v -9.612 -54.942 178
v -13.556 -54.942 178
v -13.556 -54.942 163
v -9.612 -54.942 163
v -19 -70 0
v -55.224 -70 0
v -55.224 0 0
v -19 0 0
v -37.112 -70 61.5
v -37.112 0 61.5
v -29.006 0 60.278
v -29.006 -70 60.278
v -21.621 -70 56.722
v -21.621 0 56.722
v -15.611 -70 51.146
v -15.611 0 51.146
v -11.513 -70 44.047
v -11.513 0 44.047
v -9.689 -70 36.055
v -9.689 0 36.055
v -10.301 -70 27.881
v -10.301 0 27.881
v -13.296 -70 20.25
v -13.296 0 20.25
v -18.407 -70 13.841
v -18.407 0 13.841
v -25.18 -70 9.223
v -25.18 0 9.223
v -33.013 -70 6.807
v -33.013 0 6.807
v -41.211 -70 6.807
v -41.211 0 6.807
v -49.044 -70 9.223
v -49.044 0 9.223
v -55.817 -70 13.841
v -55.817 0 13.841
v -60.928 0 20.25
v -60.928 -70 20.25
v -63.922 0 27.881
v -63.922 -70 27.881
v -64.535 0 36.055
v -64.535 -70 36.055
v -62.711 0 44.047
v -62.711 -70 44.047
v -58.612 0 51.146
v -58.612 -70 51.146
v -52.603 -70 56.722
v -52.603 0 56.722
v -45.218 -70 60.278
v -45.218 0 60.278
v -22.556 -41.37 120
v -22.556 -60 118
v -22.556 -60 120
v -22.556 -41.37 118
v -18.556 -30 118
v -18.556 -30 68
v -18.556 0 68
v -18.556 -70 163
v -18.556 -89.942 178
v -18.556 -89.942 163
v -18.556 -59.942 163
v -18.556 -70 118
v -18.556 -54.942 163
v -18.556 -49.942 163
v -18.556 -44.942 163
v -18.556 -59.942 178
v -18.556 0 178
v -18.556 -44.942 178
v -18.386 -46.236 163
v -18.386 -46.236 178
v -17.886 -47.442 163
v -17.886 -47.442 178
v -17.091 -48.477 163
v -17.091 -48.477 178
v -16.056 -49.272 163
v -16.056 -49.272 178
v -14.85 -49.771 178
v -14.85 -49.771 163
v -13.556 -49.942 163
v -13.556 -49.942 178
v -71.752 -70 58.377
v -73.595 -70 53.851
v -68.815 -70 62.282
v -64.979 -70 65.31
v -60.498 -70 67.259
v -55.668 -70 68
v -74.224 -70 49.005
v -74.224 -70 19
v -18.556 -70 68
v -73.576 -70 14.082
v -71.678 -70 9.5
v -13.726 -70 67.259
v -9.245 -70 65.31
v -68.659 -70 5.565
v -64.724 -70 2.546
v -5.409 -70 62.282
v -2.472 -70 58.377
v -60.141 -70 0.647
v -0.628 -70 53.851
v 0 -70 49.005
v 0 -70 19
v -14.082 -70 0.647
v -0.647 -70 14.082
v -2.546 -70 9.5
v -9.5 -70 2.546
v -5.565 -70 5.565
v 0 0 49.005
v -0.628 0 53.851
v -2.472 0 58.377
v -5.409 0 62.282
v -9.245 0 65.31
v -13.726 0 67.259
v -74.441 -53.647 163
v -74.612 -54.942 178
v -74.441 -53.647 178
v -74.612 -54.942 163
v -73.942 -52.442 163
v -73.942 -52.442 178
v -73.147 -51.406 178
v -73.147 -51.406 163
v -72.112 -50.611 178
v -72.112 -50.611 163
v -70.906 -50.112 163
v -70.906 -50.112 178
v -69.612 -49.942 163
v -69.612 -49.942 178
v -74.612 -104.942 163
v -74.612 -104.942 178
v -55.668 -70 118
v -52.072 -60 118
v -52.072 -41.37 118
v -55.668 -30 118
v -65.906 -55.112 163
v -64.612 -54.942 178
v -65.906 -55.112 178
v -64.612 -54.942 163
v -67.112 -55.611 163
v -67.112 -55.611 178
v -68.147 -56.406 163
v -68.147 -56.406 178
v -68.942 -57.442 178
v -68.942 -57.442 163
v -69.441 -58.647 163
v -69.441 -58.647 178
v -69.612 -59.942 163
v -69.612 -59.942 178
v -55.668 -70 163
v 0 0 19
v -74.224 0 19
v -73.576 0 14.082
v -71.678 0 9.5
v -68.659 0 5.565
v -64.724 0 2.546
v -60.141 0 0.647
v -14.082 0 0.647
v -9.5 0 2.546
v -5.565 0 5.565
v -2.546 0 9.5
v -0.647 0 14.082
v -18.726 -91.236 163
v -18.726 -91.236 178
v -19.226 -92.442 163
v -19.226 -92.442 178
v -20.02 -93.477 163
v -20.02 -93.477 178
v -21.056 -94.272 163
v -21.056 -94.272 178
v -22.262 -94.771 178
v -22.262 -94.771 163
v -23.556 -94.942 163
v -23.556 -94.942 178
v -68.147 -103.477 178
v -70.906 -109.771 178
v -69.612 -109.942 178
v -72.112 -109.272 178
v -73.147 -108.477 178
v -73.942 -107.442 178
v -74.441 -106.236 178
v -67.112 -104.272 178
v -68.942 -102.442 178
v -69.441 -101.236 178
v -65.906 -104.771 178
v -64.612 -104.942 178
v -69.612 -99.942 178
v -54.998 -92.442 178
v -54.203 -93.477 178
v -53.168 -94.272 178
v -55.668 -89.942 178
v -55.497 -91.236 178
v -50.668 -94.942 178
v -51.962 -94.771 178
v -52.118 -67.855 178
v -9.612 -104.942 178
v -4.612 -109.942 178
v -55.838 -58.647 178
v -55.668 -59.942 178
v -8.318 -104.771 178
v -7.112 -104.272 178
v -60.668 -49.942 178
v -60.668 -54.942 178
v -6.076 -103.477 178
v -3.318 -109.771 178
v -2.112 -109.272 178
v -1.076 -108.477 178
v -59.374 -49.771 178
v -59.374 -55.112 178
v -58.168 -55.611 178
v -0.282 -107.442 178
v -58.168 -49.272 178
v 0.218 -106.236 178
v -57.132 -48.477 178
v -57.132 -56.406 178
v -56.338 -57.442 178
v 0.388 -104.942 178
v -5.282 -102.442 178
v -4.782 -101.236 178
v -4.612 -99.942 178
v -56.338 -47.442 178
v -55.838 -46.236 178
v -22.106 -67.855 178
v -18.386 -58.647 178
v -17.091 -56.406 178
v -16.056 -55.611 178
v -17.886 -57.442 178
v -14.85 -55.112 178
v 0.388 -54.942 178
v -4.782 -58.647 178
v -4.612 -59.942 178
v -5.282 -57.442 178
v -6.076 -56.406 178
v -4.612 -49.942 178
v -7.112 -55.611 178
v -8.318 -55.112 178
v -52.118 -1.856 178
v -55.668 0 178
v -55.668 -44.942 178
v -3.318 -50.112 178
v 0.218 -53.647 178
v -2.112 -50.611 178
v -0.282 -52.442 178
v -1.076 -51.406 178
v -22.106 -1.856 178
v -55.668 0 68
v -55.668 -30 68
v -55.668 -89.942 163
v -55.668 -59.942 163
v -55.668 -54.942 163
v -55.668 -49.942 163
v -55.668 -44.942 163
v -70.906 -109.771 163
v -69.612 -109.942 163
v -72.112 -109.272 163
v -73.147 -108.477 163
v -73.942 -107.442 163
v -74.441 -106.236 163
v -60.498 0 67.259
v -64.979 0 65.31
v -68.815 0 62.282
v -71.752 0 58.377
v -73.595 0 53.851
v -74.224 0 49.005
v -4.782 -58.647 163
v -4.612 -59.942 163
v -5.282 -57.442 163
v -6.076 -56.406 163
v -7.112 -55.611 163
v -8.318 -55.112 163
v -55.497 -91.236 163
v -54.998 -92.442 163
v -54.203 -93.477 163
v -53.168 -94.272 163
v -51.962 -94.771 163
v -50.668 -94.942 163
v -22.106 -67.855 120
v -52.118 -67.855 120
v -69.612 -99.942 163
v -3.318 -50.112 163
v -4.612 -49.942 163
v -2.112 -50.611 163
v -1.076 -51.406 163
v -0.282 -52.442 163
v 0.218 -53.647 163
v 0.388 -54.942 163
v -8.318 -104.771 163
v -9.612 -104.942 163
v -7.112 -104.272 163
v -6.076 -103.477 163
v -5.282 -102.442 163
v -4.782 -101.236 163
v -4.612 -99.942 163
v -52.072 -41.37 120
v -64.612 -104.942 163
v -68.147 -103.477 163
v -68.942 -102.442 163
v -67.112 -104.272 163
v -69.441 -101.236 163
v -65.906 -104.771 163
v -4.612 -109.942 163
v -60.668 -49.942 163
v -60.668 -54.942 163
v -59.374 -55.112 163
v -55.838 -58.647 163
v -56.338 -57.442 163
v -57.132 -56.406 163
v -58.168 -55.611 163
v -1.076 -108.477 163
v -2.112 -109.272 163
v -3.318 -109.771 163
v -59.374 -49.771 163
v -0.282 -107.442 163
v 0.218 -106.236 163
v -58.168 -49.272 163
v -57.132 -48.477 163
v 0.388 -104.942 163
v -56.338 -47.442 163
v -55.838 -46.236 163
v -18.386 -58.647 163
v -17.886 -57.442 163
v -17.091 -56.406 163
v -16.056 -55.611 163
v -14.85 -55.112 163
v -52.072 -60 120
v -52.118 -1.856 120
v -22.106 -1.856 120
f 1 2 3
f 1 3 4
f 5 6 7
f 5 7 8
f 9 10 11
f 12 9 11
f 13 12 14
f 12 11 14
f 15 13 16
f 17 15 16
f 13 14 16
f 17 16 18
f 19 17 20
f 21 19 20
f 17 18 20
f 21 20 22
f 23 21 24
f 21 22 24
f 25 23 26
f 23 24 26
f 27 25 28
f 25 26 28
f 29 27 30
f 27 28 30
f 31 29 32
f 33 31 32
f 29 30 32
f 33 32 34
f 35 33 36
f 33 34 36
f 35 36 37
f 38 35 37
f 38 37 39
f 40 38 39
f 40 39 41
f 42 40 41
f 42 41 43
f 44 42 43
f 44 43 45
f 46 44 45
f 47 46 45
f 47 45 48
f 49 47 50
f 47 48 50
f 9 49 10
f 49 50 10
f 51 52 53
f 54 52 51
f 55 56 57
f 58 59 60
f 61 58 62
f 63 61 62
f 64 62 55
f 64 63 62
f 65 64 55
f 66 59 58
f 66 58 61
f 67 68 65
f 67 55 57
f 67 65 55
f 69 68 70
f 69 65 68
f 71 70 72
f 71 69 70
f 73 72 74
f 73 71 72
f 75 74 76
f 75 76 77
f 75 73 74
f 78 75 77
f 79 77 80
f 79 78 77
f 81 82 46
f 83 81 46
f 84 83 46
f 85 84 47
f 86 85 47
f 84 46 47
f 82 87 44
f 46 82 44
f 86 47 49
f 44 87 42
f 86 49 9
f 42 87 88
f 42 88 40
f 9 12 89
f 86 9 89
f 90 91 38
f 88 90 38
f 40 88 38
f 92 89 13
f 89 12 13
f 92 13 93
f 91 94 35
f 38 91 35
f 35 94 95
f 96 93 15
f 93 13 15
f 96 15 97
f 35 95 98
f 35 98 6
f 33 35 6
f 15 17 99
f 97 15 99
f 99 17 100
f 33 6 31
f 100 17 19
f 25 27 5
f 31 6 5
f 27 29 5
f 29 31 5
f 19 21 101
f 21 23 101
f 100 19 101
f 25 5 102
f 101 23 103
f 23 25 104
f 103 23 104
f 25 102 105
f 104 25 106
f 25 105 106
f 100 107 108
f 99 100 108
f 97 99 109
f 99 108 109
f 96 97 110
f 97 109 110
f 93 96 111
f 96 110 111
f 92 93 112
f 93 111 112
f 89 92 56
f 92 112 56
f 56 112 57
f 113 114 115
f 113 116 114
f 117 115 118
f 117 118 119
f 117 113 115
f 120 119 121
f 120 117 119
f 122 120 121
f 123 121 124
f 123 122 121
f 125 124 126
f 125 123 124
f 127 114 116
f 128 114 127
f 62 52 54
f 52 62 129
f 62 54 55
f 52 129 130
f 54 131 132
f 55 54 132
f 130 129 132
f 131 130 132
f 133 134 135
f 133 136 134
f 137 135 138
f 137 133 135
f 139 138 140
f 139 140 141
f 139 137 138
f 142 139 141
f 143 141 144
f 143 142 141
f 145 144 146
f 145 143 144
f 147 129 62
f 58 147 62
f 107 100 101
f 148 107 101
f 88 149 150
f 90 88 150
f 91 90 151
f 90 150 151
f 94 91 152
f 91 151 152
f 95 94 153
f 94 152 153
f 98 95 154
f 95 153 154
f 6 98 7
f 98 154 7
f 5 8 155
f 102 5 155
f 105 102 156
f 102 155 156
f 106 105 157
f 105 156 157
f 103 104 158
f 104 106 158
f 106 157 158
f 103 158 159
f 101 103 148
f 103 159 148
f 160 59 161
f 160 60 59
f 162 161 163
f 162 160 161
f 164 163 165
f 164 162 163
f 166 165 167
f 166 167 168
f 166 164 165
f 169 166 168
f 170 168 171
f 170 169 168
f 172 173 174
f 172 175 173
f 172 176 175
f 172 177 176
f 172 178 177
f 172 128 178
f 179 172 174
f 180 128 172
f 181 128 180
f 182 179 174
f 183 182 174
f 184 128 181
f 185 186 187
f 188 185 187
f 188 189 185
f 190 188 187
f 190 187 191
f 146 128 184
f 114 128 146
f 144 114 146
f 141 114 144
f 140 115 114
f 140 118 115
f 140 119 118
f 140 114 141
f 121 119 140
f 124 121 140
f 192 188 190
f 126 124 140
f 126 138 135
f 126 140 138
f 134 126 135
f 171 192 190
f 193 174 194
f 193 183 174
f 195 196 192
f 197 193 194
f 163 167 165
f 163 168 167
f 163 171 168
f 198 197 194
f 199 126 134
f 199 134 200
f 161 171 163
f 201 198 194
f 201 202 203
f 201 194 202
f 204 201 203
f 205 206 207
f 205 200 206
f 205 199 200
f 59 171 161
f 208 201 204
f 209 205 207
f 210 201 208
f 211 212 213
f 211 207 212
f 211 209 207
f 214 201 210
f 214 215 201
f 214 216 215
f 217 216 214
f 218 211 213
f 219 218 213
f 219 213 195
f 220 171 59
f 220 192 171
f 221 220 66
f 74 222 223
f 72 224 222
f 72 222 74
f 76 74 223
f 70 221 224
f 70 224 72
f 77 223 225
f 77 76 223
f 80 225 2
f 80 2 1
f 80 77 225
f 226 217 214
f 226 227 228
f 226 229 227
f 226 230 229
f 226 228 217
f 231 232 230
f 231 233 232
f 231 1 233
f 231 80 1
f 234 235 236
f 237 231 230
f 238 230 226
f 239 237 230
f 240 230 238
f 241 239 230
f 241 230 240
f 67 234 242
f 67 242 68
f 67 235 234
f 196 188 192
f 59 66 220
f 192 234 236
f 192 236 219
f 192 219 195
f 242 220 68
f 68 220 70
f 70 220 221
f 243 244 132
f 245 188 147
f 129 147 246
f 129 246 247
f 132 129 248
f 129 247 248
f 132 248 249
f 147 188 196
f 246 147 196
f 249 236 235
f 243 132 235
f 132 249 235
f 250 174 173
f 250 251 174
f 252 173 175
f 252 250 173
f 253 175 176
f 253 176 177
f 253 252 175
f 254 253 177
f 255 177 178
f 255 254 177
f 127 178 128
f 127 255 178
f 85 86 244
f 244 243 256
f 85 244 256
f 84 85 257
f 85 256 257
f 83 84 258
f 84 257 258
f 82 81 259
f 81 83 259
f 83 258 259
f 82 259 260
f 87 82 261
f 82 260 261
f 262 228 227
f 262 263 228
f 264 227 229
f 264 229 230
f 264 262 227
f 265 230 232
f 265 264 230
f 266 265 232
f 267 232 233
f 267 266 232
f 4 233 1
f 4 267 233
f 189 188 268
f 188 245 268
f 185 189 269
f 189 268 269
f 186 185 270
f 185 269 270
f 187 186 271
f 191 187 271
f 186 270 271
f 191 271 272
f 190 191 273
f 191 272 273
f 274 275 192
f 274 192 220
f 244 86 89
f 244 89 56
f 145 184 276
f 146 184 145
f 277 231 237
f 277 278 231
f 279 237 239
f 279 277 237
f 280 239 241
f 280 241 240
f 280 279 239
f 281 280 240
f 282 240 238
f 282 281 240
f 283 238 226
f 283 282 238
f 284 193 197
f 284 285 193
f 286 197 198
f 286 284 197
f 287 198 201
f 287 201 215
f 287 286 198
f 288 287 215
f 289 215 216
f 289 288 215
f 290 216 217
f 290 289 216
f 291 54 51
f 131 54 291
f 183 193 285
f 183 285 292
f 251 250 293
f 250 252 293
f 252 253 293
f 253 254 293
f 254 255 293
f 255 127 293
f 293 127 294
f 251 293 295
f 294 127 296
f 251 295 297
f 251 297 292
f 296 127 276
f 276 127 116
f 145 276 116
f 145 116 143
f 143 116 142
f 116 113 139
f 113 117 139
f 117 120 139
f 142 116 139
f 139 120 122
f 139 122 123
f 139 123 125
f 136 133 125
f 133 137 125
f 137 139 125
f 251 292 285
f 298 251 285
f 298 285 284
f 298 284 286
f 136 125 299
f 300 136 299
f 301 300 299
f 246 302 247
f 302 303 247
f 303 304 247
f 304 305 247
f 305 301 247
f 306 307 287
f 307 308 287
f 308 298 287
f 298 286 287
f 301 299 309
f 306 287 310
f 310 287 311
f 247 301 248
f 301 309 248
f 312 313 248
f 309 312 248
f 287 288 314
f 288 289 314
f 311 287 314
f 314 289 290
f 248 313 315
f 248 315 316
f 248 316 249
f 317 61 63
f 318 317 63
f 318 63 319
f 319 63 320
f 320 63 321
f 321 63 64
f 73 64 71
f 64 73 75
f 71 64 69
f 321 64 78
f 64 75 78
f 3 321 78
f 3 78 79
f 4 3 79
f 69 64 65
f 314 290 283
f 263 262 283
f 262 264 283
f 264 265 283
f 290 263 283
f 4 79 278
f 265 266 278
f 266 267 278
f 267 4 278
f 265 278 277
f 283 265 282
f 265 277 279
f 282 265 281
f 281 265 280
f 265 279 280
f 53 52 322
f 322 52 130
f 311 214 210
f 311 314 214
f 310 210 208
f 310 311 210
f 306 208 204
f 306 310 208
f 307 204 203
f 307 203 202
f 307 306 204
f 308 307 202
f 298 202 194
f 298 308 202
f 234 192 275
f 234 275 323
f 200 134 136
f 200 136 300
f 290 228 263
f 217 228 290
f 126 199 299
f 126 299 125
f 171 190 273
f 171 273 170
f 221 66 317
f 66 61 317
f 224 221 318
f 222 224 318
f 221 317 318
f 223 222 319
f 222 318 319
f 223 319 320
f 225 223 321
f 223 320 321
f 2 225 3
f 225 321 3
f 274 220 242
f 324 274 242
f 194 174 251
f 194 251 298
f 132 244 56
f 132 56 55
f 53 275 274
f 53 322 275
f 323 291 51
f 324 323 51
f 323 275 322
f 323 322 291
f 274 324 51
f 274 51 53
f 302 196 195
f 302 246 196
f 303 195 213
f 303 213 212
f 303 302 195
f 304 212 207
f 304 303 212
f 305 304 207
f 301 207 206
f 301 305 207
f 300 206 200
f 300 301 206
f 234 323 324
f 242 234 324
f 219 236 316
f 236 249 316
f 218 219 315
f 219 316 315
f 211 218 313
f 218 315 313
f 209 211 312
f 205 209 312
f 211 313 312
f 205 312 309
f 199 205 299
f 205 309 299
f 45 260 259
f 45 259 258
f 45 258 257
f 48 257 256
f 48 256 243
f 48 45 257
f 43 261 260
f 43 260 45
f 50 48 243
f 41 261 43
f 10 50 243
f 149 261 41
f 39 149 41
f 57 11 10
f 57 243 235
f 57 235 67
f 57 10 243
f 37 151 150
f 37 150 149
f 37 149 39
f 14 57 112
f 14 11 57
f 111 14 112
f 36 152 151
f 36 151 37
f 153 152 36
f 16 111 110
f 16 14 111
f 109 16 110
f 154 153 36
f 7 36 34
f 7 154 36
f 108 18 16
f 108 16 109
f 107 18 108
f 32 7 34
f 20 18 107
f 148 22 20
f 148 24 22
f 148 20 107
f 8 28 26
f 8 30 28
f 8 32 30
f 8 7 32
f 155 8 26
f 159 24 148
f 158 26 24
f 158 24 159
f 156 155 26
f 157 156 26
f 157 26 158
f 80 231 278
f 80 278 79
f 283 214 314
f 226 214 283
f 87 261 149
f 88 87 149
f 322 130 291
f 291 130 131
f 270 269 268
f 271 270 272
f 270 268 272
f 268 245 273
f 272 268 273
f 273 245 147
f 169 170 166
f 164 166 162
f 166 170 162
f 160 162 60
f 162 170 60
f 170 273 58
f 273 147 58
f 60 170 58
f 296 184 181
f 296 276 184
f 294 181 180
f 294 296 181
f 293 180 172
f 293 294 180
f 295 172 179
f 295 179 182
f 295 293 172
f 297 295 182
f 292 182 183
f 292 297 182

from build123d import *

# Parameters (mm, degrees)
SKETCH1_W           = 74.22368895
SKETCH1_H           = 68
SKETCH1_W_2         = 37.111844475
SKETCH1_H_2         = 52
SKETCH1_H_3         = 58
BOSS_EXTRUDE1_DEPTH = 70
SKETCH2_R           = 27.5
CUT_EXTRUDE1_DEPTH  = 70
FILLET1_R           = 19
SKETCH3_W           = 33.111844475
SKETCH3_H           = 64.288874977
CUT_EXTRUDE2_DEPTH  = 58
SKETCH5_W           = 50
SKETCH5_H           = 40
CUT_EXTRUDE3_DEPTH  = 58
SKETCH7_W           = 29.516350972
SKETCH7_H           = 18.630296647
CUT_EXTRUDE5_DEPTH  = 58
SKETCH8_W           = 33.111844475
SKETCH8_H           = 2
CUT_EXTRUDE6_DEPTH  = 58
SKETCH9_W           = 1.55
SKETCH9_H           = 66.288874977
BOSS_EXTRUDE2_DEPTH = 58
SKETCH10_W          = 30.011844475
SKETCH10_H          = 0.145
BOSS_EXTRUDE3_DEPTH = 58
SKETCH11_W          = 37.111844475
SKETCH11_H          = 24.941562027
BOSS_EXTRUDE5_DEPTH = 15
FILLET3_R           = 5
FILLET4_R           = 5
FILLET5_R           = 5


with BuildPart() as part:
    # Sketch1 → Boss-Extrude1 (new body)
    with BuildSketch(Plane(origin=(0, 0, 0), x_dir=(1, 0, 0), z_dir=(0, 1, 0))):
        with Locations((-37.111844475, -34)):
            Rectangle(SKETCH1_W, SKETCH1_H)
        with Locations((-37.111844475, -94)):
            Rectangle(SKETCH1_W_2, SKETCH1_H_2)
        with Locations((-37.111844475, -149)):
            Rectangle(SKETCH1_W_2, SKETCH1_H_3)
    extrude(amount=-BOSS_EXTRUDE1_DEPTH)

    # Sketch2 → Cut-Extrude1 (cut)
    with BuildSketch(Plane(origin=(0, 0, 0), x_dir=(1, 0, 0), z_dir=(0, 1, 0))):
        with Locations(Location((-37.111844475, -34, 0), (0, 0, 270))):
            Circle(SKETCH2_R)
    extrude(amount=-CUT_EXTRUDE1_DEPTH, mode=Mode.SUBTRACT)

    # Fillet1
    # the kernel refuses this fillet: 19 mm, written as the material it takes off along each edge
    with BuildSketch(Plane(origin=(0, 47.487024211, 68), x_dir=(0, 0, -1), z_dir=(0, -1, 0))) as fillet1_piece_1:
        with BuildLine():
            CenterArc((18.994809684, -19), FILLET1_R, 90, 88.660731648)
            Line((0, -18.555922237), (-0.379896194, -18.547040682))
            ThreePointArc((-0.379896194, -18.547040682), (-0.38, -9.277961119), (-0.38, 0))
            Line((-0.38, 0), (0, 0.38))
            Line((0, 0.38), (18.994809684, 0.38))
            Line((18.994809684, 0.38), (18.994809684, 0))
        make_face()
    extrude(amount=164.974048421, mode=Mode.SUBTRACT)
    with BuildSketch(Plane(origin=(0, 47.5, 0), x_dir=(-1, 0, 0), z_dir=(0, -1, 0))) as fillet1_piece_2:
        with BuildLine():
            CenterArc((FILLET1_R, -FILLET1_R), FILLET1_R, 90, 90)
            Line((0, -FILLET1_R), (-FILLET1_R * 0.02, -FILLET1_R))
            Line((-FILLET1_R * 0.02, -FILLET1_R), (-FILLET1_R * 0.02, FILLET1_R * 0.02))
            Line((-FILLET1_R * 0.02, FILLET1_R * 0.02), (FILLET1_R, FILLET1_R * 0.02))
            Line((FILLET1_R, FILLET1_R * 0.02), (FILLET1_R, 0))
        make_face()
    extrude(amount=165, mode=Mode.SUBTRACT)
    with BuildSketch(Plane(origin=(-74.22368895, 47.487024211, 68), x_dir=(0, 0, -1), z_dir=(0, -1, 0))) as fillet1_piece_3:
        with BuildLine():
            CenterArc((18.994809684, 19), FILLET1_R, 181.339268352, 88.660731648)
            Line((0, 18.555922237), (-0.379896194, 18.547040682))
            ThreePointArc((-0.379896194, 18.547040682), (-0.38, 9.277961119), (-0.38, 0))
            Line((-0.38, 0), (0, -0.38))
            Line((0, -0.38), (18.994809684, -0.38))
            Line((18.994809684, -0.38), (18.994809684, 0))
        make_face()
    extrude(amount=164.974048421, mode=Mode.SUBTRACT)
    with BuildSketch(Plane(origin=(-74.22368895, 47.5, 0), x_dir=(1, 0, 0), z_dir=(0, -1, 0))) as fillet1_piece_4:
        with BuildLine():
            CenterArc((FILLET1_R, FILLET1_R), FILLET1_R, 180, 90)
            Line((0, FILLET1_R), (-FILLET1_R * 0.02, FILLET1_R))
            Line((-FILLET1_R * 0.02, FILLET1_R), (-FILLET1_R * 0.02, -FILLET1_R * 0.02))
            Line((-FILLET1_R * 0.02, -FILLET1_R * 0.02), (FILLET1_R, -FILLET1_R * 0.02))
            Line((FILLET1_R, -FILLET1_R * 0.02), (FILLET1_R, 0))
        make_face()
    extrude(amount=165, mode=Mode.SUBTRACT)

    # Sketch3 → Cut-Extrude2 (cut)
    with BuildSketch(Plane.XY.offset(178)):
        with Locations((-37.111844475, -35.855562511)):
            Rectangle(SKETCH3_W, SKETCH3_H)
    extrude(amount=-CUT_EXTRUDE2_DEPTH, mode=Mode.SUBTRACT)

    # Sketch5 → Cut-Extrude3 (cut)
    with BuildSketch(Plane.ZY.offset(55.667766712)):
        with Locations((93, -50)):
            Rectangle(SKETCH5_W, SKETCH5_H)
    extrude(amount=-CUT_EXTRUDE3_DEPTH, mode=Mode.SUBTRACT)

    # Sketch7 → Cut-Extrude5 (cut)
    with BuildSketch(Plane(origin=(0, 0, 118), x_dir=(-1, 0, 0), z_dir=(0, 0, -1))):
        with Locations((37.314097723, -50.684851677)):
            Rectangle(SKETCH7_W, SKETCH7_H)
    extrude(amount=-CUT_EXTRUDE5_DEPTH, mode=Mode.SUBTRACT)

    # Sketch8 → Cut-Extrude6 (cut)
    with BuildSketch(Plane.XY.offset(178)):
        with Locations((-37.111844475, -2.711125023)):
            Rectangle(SKETCH8_W, SKETCH8_H)
    extrude(amount=-CUT_EXTRUDE6_DEPTH, mode=Mode.SUBTRACT)

    # Sketch9 → Boss-Extrude2 (add)
    with BuildSketch(Plane.XY.offset(178)):
        with Locations((-52.892766712, -34.855562511)):
            Rectangle(SKETCH9_W, SKETCH9_H)
        with Locations((-21.330922237, -34.855562511)):
            Rectangle(SKETCH9_W, SKETCH9_H)
    extrude(amount=-BOSS_EXTRUDE2_DEPTH)

    # Sketch10 → Boss-Extrude3 (add)
    with BuildSketch(Plane.XY.offset(178)):
        with Locations((-37.111844475, -67.9275)):
            Rectangle(SKETCH10_W, SKETCH10_H)
        with Locations((-37.111844475, -1.783625023)):
            Rectangle(SKETCH10_W, SKETCH10_H)
    extrude(amount=-BOSS_EXTRUDE3_DEPTH)

    # Sketch11 → Boss-Extrude5 (add)
    with BuildSketch(Plane.XY.offset(178)):
        Polygon((-74.611844475, -49.941562027), (-74.611844475, -109.941562027), (0.388155525, -109.941562027), (0.388155525, -49.941562027), (-18.555922237, -49.941562027), (-18.555922237, -54.941562027), (-4.611844475, -54.941562027), (-4.611844475, -104.941562027), (-69.611844475, -104.941562027), (-69.611844475, -54.941562027), (-55.667766712, -54.941562027), (-55.667766712, -49.941562027), align=None)
        with Locations((-37.111844475, -82.470781014)):
            Rectangle(SKETCH11_W, SKETCH11_H)
    extrude(amount=-BOSS_EXTRUDE5_DEPTH)

    # Fillet3
    fillet3_edges = [part.edges().sort_by_distance(p)[0] for p in [
        (-4.611844475, -104.941562027, 170.5),
        (-4.611844475, -54.941562027, 170.5),
        (0.388155525, -49.941562027, 170.5),
        (0.388155525, -109.941562027, 170.5),
        (-74.611844475, -109.941562027, 170.5),
        (-74.611844475, -49.941562027, 170.5),
        (-69.611844475, -54.941562027, 170.5),
        (-69.611844475, -104.941562027, 170.5),
        (-18.555922237, -94.941562027, 170.5),
        (-55.667766712, -94.941562027, 170.5),
    ]]
    fillet(fillet3_edges, radius=FILLET3_R)

    # Fillet4
    fillet4_edges = [part.edges().sort_by_distance(p)[0] for p in [
        (-18.555922237, -54.941562027, 170.5),
        (-55.667766712, -54.941562027, 170.5),
    ]]
    fillet(fillet4_edges, radius=FILLET4_R)

    # Fillet5
    fillet5_edges = [part.edges().sort_by_distance(p)[0] for p in [
        (-18.555922237, -49.941562027, 170.5),
        (-55.667766712, -49.941562027, 170.5),
    ]]
    fillet(fillet5_edges, radius=FILLET5_R)


solid = part.part
